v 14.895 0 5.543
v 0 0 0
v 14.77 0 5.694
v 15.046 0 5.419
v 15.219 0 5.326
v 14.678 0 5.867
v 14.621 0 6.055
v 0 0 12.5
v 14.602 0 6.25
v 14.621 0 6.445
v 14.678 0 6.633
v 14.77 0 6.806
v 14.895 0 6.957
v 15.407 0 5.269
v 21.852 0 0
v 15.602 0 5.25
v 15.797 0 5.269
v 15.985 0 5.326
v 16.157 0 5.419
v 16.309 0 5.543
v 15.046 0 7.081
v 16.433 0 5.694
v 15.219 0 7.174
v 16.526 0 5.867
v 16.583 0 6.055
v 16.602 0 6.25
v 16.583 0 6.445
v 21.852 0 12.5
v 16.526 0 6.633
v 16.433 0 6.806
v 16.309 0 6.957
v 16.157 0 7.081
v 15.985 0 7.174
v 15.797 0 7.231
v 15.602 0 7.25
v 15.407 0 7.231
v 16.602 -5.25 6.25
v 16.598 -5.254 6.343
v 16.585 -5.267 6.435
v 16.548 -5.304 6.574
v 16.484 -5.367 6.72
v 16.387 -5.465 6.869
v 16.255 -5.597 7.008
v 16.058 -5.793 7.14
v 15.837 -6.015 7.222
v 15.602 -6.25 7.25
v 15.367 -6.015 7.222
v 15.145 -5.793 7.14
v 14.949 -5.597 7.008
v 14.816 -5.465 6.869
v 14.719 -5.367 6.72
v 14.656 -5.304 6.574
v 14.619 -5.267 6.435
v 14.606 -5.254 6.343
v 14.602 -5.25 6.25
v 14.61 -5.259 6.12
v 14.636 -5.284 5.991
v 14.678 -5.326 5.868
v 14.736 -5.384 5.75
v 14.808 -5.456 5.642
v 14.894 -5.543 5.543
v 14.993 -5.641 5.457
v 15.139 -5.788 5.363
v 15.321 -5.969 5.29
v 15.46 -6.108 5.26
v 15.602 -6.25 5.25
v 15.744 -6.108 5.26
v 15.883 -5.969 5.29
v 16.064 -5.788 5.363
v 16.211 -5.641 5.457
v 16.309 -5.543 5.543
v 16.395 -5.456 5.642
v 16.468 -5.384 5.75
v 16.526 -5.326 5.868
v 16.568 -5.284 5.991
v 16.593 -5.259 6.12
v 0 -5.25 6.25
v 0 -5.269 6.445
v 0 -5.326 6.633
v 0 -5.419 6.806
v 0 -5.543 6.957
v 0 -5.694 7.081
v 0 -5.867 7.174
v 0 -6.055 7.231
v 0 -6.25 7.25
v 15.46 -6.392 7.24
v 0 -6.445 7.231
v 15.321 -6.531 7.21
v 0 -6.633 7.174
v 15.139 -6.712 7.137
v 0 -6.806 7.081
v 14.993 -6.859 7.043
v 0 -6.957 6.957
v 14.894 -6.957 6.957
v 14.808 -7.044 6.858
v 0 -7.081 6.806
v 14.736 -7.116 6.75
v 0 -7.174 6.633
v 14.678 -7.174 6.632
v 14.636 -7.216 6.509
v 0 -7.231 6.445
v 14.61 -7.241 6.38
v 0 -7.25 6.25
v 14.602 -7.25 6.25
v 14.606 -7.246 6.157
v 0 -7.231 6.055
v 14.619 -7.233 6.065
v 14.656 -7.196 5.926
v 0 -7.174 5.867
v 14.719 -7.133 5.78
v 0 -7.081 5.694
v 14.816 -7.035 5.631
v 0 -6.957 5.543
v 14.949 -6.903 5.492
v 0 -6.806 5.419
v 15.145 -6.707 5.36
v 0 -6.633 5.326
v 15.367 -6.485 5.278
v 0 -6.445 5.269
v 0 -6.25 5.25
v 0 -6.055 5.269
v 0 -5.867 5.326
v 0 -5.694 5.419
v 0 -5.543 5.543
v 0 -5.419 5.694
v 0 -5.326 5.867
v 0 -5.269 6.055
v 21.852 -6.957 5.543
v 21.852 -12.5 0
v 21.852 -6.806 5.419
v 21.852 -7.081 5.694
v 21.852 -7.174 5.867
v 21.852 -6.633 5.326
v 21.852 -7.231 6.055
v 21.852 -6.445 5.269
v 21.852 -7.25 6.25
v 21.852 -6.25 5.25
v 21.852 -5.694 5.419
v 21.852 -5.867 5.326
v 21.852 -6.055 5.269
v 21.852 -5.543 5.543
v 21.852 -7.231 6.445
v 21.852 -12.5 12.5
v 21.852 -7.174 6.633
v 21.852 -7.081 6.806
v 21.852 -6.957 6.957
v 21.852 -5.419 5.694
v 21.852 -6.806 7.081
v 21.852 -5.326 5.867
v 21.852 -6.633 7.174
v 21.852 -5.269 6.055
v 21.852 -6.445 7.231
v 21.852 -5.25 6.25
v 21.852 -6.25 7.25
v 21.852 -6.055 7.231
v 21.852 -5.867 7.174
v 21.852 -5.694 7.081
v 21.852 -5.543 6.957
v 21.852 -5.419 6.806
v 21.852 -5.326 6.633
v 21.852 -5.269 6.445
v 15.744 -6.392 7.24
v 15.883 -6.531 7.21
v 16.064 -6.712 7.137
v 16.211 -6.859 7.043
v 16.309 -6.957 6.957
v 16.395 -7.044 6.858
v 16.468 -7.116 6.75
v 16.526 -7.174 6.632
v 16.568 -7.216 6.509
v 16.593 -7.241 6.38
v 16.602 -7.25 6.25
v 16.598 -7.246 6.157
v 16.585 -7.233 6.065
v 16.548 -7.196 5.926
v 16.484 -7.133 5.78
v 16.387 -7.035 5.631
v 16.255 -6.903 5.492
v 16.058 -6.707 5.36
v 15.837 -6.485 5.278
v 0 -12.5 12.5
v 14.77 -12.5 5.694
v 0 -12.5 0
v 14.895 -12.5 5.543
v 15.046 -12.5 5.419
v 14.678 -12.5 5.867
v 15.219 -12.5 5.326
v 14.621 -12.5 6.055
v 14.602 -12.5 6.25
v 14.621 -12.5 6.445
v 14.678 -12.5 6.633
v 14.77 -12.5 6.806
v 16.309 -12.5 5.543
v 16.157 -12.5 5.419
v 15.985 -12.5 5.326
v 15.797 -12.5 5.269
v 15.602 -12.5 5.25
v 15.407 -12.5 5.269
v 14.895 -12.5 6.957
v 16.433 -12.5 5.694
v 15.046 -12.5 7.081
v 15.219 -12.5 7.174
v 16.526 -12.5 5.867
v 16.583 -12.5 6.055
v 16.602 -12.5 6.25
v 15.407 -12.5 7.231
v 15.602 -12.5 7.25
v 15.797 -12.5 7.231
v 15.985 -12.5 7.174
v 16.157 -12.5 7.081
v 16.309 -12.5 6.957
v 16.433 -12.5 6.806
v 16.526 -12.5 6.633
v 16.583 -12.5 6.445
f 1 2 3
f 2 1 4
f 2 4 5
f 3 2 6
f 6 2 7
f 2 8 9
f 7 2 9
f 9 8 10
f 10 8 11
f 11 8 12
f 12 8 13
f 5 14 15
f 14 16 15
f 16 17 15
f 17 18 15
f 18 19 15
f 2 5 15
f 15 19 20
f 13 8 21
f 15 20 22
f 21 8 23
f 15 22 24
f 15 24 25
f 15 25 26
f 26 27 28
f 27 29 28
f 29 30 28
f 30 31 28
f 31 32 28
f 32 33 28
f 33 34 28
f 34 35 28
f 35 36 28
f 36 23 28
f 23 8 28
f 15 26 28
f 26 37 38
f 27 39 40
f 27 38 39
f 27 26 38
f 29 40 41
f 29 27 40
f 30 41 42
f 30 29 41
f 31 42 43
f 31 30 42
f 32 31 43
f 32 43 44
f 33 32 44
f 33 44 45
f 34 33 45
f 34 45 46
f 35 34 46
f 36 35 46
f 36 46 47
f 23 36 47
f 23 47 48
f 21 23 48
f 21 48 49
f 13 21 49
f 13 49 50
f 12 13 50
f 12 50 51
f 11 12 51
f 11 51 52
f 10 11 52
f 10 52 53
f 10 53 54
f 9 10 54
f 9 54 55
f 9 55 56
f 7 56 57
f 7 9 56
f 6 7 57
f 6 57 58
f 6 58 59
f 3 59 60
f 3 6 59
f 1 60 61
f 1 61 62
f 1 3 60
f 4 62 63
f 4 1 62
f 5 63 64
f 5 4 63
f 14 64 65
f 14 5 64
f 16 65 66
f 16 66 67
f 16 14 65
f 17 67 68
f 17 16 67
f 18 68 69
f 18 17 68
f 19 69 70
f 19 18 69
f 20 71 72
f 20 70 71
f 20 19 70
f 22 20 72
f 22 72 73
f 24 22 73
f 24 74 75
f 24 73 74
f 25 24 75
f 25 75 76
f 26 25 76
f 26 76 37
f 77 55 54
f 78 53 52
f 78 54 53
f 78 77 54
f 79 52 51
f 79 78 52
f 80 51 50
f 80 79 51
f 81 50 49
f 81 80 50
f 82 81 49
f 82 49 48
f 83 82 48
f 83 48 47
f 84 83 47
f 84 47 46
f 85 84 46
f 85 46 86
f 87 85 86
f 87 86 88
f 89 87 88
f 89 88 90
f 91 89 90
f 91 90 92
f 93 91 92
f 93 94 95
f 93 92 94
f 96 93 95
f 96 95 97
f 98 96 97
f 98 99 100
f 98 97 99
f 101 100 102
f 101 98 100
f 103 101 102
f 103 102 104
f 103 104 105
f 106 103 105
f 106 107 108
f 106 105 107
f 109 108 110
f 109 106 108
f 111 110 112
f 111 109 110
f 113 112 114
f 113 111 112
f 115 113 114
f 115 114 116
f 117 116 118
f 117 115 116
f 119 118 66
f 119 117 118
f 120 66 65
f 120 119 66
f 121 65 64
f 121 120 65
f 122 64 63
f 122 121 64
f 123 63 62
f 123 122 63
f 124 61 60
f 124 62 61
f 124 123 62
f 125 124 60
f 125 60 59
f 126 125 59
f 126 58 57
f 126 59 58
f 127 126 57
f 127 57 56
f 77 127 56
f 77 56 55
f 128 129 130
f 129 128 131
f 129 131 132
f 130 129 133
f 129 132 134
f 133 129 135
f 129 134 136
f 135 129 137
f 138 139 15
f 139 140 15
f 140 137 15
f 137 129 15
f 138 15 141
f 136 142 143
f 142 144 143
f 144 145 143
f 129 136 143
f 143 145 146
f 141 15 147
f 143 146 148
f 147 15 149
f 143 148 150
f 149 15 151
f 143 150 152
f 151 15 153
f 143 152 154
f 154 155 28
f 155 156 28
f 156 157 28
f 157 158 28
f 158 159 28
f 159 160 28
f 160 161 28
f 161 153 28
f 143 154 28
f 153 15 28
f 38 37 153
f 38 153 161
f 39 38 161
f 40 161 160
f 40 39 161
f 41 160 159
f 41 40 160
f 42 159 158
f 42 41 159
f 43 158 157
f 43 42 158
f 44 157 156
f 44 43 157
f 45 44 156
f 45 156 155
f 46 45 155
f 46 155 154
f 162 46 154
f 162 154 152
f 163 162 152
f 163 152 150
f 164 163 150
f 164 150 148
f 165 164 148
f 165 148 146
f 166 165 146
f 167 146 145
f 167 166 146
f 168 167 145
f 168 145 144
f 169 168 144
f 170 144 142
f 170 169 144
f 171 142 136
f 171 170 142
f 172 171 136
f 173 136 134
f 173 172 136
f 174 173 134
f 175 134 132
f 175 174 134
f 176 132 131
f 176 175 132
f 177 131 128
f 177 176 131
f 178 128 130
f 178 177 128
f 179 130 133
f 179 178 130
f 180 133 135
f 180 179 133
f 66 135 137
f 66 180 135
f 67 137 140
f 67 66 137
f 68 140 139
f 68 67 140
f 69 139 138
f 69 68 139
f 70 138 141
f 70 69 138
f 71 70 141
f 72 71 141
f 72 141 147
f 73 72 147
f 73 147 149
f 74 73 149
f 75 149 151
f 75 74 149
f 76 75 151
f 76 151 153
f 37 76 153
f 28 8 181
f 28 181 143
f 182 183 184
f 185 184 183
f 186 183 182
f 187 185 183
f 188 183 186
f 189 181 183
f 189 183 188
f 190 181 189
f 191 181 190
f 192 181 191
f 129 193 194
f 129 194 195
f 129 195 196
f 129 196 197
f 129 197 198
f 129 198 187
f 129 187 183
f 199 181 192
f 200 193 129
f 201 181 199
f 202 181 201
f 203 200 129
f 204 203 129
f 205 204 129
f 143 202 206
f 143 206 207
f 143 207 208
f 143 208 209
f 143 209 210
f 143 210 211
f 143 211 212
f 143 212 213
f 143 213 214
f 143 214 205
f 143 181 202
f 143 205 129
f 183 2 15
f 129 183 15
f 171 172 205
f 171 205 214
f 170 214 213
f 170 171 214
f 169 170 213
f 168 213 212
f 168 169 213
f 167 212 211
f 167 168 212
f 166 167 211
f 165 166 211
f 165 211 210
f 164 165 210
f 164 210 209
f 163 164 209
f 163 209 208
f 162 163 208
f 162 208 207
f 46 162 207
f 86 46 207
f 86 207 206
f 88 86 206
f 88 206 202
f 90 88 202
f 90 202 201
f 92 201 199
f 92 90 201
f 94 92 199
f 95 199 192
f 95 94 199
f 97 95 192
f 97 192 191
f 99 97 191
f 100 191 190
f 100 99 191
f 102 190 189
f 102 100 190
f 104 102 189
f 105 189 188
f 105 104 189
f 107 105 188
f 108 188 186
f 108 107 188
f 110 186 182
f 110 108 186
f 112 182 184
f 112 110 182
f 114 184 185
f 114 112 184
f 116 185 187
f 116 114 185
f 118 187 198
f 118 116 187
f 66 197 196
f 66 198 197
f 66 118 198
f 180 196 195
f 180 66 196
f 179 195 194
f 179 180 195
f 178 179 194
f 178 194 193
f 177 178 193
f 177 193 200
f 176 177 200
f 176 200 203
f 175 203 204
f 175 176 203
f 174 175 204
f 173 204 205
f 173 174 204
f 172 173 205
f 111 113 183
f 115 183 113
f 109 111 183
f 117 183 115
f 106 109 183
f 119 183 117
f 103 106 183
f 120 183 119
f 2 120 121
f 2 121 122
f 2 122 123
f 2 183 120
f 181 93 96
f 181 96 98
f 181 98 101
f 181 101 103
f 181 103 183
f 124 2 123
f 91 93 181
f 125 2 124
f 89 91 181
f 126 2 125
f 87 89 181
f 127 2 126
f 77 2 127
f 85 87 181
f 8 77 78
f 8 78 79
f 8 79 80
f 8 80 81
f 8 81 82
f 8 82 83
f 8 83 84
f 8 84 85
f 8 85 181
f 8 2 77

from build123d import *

# Parameters (mm, degrees)
SKETCH_W        = 21.85185
SKETCH_H        = 12.5
PAD_DEPTH       = 12.5
SKETCH001_R     = 1
POCKET_DEPTH    = 50
SKETCH002_R     = 1
POCKET001_DEPTH = 50


with BuildPart() as part:
    # Sketch → Pad (new body)
    with BuildSketch(Plane.XZ):
        with Locations((10.925925, 6.25)):
            Rectangle(SKETCH_W, SKETCH_H)
    extrude(amount=PAD_DEPTH)

    # Sketch001 → Pocket (cut)
    with BuildSketch(Plane.YZ):
        with Locations((-6.25, 6.25)):
            Circle(SKETCH001_R)
    extrude(amount=POCKET_DEPTH, mode=Mode.SUBTRACT)

    # Sketch002 → Pocket001 (cut)
    with BuildSketch(Plane.XZ):
        with Locations((15.60185, 6.25)):
            Circle(SKETCH002_R)
    extrude(amount=POCKET001_DEPTH, mode=Mode.SUBTRACT)


solid = part.part
